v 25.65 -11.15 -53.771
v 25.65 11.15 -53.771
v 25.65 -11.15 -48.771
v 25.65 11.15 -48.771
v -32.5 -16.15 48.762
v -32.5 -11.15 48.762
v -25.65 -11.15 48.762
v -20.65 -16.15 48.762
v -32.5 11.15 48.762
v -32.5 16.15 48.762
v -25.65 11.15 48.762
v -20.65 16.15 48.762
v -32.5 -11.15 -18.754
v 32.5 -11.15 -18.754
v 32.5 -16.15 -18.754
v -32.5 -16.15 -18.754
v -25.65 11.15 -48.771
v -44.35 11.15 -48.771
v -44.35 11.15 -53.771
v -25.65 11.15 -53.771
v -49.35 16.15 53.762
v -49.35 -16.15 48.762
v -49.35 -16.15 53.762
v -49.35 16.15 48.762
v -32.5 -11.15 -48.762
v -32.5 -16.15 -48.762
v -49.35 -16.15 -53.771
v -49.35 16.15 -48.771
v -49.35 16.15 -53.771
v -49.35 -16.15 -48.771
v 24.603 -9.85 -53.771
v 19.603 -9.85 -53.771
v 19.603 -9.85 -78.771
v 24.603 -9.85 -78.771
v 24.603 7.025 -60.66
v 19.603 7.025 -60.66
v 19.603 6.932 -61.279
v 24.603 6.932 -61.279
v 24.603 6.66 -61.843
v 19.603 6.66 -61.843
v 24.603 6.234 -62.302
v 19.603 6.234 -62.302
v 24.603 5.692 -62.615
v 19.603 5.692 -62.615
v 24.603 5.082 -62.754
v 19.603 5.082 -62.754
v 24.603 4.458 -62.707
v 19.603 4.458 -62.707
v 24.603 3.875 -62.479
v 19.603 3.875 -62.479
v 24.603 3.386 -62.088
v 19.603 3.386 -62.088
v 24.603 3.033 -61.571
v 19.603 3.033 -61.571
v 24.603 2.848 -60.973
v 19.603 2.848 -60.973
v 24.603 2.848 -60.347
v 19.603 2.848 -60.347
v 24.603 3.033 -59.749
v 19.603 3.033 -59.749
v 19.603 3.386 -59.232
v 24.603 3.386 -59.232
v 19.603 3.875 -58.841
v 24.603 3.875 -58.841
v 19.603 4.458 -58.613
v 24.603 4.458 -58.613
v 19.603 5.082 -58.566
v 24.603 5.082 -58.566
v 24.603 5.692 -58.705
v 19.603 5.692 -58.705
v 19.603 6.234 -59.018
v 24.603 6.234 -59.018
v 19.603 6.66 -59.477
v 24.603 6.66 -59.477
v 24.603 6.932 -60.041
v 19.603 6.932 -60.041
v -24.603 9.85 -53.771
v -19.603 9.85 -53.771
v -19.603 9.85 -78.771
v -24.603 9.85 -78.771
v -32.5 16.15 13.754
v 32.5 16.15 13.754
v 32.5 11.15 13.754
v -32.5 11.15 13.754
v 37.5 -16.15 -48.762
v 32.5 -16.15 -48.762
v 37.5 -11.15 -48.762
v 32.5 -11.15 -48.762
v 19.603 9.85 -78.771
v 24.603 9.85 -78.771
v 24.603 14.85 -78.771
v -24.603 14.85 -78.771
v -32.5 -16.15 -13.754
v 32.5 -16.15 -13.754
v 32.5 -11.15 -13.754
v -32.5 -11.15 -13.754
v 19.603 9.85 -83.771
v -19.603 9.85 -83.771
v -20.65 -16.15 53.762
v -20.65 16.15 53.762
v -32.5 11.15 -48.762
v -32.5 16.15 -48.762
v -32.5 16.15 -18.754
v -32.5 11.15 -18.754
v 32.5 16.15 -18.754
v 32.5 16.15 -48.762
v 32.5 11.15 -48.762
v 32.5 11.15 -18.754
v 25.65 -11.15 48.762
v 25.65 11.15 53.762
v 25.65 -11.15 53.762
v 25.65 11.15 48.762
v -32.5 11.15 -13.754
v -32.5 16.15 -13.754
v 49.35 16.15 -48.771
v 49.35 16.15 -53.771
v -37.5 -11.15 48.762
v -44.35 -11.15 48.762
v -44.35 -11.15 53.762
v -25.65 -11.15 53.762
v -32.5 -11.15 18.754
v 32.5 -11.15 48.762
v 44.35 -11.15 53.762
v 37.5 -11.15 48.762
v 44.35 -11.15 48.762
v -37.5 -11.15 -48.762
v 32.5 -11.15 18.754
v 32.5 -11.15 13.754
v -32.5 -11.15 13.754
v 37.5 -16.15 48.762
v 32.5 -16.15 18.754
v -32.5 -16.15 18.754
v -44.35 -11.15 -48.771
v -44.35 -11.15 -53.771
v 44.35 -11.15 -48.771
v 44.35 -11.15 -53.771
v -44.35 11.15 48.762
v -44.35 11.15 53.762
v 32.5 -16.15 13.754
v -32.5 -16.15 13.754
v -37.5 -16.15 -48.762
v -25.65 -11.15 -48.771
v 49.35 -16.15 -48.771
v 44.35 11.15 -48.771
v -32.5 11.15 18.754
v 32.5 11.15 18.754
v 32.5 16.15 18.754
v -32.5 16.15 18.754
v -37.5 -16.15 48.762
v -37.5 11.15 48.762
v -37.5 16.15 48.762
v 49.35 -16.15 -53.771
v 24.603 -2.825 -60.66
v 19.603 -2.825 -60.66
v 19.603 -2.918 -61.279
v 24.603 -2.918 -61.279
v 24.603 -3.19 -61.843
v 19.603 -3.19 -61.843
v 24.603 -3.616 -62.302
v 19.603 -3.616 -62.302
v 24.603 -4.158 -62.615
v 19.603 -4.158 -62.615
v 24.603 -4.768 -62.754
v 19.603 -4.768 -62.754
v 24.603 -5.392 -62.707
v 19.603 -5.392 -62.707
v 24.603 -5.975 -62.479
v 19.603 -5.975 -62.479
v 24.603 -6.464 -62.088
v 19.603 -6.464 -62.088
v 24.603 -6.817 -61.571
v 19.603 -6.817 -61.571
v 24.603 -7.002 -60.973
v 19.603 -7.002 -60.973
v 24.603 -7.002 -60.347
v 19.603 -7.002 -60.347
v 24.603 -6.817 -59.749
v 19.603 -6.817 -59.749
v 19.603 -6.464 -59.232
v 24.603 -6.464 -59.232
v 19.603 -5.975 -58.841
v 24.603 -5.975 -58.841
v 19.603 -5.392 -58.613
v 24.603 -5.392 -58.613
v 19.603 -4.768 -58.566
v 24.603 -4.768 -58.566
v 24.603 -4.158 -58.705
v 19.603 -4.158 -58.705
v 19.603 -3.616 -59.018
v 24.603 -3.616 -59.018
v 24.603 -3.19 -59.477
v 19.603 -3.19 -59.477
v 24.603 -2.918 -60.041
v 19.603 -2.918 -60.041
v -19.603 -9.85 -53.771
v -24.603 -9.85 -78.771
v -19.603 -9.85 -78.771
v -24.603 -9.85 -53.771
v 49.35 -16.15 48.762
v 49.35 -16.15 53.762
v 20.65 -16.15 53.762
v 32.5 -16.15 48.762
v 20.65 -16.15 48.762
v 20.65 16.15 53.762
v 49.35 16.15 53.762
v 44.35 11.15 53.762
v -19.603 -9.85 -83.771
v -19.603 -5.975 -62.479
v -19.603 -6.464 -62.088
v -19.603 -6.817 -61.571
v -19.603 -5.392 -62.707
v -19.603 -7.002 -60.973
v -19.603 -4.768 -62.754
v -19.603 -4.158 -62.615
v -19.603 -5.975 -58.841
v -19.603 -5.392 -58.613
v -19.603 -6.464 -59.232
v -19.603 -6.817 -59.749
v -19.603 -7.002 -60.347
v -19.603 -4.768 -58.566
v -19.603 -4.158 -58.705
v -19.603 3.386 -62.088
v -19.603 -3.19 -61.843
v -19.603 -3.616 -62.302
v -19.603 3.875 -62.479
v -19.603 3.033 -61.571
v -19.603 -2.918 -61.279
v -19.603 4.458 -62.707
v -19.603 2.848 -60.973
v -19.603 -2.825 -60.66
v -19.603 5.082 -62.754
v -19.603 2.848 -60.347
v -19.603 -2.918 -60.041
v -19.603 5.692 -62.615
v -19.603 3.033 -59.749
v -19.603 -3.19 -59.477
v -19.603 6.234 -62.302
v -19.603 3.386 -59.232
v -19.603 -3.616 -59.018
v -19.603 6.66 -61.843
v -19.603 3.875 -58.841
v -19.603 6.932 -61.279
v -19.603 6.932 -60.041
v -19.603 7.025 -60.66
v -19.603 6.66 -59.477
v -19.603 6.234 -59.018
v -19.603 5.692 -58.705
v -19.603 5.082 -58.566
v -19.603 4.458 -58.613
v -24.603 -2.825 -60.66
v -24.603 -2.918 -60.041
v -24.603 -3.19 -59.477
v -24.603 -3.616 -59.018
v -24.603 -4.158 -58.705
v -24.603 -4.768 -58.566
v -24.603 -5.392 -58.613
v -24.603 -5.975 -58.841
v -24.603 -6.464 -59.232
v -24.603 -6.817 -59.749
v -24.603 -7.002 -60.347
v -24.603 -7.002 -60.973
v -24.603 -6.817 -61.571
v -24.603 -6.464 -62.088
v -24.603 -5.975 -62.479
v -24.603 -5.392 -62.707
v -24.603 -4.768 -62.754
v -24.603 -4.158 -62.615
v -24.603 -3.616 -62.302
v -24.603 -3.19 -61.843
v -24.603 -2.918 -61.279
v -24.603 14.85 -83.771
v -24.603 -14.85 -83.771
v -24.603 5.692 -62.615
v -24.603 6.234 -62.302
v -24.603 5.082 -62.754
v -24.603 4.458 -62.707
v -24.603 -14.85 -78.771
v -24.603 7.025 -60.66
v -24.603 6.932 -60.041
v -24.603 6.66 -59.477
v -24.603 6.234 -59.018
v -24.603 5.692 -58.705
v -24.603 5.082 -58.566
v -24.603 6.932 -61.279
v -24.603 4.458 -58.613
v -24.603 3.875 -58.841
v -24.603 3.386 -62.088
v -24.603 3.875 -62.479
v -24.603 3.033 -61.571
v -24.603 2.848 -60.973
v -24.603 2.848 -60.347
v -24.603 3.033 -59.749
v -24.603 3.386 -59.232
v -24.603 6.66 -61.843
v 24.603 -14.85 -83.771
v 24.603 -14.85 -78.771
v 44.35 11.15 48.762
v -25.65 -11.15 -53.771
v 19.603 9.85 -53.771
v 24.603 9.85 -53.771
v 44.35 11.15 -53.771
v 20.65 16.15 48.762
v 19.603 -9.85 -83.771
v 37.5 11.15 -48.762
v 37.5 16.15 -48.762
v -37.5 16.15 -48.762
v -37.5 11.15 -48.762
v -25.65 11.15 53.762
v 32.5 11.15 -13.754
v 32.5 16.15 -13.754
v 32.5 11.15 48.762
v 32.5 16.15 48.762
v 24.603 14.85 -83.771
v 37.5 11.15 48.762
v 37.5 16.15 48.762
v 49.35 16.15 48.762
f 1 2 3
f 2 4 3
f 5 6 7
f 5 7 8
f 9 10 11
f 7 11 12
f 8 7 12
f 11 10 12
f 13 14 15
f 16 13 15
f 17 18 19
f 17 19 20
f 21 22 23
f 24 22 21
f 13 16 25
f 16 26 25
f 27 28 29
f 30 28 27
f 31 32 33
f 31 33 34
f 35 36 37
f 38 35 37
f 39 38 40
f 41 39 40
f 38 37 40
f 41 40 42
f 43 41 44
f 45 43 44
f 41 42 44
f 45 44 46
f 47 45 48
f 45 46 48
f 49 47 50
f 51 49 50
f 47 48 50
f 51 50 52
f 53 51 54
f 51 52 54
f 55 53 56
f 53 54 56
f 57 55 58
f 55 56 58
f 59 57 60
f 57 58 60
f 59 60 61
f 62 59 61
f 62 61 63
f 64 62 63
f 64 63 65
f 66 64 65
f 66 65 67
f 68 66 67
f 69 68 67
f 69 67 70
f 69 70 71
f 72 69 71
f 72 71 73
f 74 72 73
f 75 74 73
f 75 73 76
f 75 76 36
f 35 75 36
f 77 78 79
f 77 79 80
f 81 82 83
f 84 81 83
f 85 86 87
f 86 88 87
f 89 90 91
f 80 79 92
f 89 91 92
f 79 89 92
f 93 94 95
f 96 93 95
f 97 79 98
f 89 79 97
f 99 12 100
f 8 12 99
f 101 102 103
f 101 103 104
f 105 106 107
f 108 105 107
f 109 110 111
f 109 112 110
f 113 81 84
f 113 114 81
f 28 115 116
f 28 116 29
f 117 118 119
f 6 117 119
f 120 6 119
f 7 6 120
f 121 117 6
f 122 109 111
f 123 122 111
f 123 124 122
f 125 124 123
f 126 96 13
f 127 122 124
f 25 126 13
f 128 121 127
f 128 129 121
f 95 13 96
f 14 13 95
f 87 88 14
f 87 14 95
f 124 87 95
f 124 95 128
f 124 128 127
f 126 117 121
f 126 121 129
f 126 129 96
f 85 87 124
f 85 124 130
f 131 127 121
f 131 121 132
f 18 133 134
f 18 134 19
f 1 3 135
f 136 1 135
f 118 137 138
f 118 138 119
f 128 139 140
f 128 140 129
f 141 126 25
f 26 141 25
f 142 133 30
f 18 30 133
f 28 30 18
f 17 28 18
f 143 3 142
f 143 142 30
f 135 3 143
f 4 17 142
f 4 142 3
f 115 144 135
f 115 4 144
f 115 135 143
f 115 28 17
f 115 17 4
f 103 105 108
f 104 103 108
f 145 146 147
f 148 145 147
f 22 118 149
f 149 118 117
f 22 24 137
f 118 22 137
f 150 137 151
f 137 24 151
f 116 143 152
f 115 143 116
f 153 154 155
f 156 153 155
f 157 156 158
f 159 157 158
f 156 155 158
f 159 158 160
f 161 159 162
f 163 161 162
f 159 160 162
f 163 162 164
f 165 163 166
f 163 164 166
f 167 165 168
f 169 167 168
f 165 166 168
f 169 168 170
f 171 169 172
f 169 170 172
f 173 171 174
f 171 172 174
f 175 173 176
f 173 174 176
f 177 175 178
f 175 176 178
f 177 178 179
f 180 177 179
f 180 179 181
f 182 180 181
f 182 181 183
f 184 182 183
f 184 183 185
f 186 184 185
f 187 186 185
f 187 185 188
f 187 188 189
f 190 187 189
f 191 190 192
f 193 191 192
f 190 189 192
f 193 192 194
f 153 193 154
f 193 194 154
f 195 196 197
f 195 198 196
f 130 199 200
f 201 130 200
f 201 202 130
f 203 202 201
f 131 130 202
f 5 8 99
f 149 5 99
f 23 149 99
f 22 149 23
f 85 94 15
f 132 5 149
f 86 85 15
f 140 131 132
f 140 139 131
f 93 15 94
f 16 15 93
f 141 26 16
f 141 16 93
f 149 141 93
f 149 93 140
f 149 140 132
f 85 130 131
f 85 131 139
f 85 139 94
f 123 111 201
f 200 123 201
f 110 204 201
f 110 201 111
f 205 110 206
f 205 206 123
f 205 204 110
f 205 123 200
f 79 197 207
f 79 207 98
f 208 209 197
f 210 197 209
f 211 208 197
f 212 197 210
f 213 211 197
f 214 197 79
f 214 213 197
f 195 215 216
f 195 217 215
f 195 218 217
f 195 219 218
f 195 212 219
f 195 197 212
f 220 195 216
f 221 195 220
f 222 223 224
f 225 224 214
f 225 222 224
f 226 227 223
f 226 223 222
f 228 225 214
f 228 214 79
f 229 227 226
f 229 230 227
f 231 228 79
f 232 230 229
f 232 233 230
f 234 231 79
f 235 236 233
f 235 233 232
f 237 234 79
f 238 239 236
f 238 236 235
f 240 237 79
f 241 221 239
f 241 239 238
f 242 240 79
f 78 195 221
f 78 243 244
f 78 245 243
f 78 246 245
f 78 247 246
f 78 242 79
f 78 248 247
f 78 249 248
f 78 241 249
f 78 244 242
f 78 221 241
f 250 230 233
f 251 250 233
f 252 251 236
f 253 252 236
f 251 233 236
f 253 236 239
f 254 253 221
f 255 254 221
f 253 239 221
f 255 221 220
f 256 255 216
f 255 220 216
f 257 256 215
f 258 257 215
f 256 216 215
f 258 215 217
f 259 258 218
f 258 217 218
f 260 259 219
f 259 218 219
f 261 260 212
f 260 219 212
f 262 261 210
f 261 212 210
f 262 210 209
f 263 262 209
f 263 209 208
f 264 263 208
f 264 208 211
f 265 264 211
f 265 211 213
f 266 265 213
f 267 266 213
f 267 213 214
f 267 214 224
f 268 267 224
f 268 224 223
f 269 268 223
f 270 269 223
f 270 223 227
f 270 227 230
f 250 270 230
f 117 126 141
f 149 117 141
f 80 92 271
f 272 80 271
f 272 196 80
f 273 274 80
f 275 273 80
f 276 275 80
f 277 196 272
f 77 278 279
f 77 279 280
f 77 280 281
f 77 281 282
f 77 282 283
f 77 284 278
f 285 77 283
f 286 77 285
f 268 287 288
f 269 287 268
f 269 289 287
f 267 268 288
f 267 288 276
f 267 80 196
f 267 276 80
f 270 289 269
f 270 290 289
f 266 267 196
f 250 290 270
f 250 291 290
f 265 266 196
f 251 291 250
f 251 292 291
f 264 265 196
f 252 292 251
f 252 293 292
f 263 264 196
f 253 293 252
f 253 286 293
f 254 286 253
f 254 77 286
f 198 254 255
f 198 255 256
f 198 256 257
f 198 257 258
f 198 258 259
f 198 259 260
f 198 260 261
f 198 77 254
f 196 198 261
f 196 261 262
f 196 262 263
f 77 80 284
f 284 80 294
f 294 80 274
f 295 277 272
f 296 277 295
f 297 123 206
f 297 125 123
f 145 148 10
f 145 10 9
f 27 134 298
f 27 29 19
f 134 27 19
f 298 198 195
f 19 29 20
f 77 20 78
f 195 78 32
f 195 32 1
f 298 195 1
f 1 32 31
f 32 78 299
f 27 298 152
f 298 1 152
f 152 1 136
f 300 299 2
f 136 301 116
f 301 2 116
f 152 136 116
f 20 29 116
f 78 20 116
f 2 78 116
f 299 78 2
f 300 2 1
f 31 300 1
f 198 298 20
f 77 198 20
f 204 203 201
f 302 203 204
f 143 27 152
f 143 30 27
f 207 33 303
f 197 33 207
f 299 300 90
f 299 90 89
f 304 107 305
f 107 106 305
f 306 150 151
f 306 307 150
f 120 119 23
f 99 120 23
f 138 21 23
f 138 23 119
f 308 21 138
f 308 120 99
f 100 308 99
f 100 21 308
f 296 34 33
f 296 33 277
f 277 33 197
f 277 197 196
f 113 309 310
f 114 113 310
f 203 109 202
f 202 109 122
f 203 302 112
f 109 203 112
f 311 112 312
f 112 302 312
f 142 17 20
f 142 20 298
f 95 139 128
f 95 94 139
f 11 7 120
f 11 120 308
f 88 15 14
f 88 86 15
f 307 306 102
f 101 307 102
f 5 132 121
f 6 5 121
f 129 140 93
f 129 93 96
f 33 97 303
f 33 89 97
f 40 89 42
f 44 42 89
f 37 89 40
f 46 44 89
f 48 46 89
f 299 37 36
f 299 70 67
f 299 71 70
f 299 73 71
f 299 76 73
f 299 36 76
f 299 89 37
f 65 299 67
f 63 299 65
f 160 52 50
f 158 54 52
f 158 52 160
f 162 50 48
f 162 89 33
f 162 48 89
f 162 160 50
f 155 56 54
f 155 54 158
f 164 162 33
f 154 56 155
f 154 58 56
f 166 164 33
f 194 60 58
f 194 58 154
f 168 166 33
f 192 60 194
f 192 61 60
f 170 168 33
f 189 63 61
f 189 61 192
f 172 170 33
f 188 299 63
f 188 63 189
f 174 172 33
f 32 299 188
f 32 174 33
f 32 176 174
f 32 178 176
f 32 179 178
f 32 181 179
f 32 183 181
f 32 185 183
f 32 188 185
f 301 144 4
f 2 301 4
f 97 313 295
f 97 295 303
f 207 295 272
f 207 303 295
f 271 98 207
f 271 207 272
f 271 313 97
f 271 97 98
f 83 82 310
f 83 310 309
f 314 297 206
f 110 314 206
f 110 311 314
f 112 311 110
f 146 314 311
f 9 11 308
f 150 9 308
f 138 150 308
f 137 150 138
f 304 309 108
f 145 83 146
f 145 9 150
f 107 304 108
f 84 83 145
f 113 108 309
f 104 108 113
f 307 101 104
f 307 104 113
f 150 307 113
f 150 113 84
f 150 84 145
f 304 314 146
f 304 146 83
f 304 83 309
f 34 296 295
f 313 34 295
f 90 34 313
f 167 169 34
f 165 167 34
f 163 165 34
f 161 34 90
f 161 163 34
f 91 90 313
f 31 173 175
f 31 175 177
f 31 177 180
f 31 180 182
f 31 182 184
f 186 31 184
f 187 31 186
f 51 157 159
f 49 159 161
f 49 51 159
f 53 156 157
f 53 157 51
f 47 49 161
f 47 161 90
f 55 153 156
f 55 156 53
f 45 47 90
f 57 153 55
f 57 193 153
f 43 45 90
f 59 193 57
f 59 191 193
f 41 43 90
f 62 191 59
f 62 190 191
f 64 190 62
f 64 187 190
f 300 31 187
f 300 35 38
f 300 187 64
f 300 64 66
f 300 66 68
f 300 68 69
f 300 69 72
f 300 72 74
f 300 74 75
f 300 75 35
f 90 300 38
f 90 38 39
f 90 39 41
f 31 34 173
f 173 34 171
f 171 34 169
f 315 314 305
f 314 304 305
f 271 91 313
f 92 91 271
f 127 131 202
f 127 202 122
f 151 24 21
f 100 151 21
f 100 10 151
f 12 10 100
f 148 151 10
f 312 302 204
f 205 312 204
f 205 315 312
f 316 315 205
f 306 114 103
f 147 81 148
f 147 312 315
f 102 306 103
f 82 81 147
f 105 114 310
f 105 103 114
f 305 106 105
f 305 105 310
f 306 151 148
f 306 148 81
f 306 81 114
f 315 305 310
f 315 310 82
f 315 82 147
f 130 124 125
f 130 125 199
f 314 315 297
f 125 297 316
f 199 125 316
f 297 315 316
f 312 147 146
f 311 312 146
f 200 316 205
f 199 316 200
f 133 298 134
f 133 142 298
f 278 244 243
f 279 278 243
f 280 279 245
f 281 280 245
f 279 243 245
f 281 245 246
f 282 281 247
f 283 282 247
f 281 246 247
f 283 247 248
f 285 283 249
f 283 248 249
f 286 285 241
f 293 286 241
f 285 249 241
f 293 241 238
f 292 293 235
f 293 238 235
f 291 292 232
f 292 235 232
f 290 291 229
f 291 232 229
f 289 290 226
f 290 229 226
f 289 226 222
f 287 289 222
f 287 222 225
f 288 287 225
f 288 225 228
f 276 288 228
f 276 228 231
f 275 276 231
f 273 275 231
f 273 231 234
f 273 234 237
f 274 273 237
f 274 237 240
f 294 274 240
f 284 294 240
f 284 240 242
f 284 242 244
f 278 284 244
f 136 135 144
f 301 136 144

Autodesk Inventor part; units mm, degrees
sketch "Sketch1" plane through (0, 0, 0) normal (0, 0, 1) x (1, 0, 0)
  line L0 (-32.5, 11.15) -> (32.5, 11.15) construction
  line L1 (32.5, 11.15) -> (32.5, -11.15) construction
  line L2 (32.5, -11.15) -> (-32.5, -11.15) construction
  line L3 (-32.5, -11.15) -> (-32.5, 11.15) construction
  line L4 (-32.5, 11.15) -> (32.5, -11.15) construction
  line L5 (32.5, 11.15) -> (-32.5, -11.15) construction
  line L6 (-32.5, 11.15) -> (-37.5, 11.15)
  line L7 (-37.5, 11.15) -> (-37.5, 16.15)
  line L8 (-37.5, 16.15) -> (-32.5, 16.15)
  line L9 (-32.5, 16.15) -> (-32.5, 11.15)
  line L10 (32.5, 11.15) -> (37.5, 11.15)
  line L11 (37.5, 11.15) -> (37.5, 16.15)
  line L12 (37.5, 16.15) -> (32.5, 16.15)
  line L13 (32.5, 16.15) -> (32.5, 11.15)
  line L14 (32.5, -11.15) -> (37.5, -11.15)
  line L15 (37.5, -11.15) -> (37.5, -16.15)
  line L16 (37.5, -16.15) -> (32.5, -16.15)
  line L17 (32.5, -16.15) -> (32.5, -11.15)
  line L18 (-32.5, -11.15) -> (-37.5, -11.15)
  line L19 (-37.5, -11.15) -> (-37.5, -16.15)
  line L20 (-37.5, -16.15) -> (-32.5, -16.15)
  line L21 (-32.5, -16.15) -> (-32.5, -11.15)
  point P0 (0, 0)
  dimension "d0" = 65
  dimension "d1" = 22.3
  dimension "d2" = 5
  dimension "d3" = 5
  dimension "d4" = 5
  dimension "d5" = 5
  dimension "d6" = 5
  dimension "d7" = 5
  dimension "d8" = 5
  dimension "d9" = 5
extrude "Extrusion1" add sketch "Sketch1" along normal mid plane 97.524
ref_plane "Work Plane1" through (0, 0, 48.762) normal (0, 0, 1) x (1, 0, 0)
sketch "Sketch2" plane through (0, 0, 48.762) normal (0, 0, 1) x (1, 0, 0)
  line L0 (0, 0) -> (-35, 0) construction
  line L1 (0, 0) -> (35, 0) construction
  line L2 (-49.35, 16.15) -> (-20.65, 16.15)
  line L3 (-20.65, 16.15) -> (-20.65, -16.15)
  line L4 (-20.65, -16.15) -> (-49.35, -16.15)
  line L5 (-49.35, -16.15) -> (-49.35, 16.15)
  line L6 (-49.35, 16.15) -> (-20.65, -16.15) construction
  line L7 (-20.65, 16.15) -> (-49.35, -16.15) construction
  line L8 (20.65, 16.15) -> (49.35, 16.15)
  line L9 (49.35, 16.15) -> (49.35, -16.15)
  line L10 (49.35, -16.15) -> (20.65, -16.15)
  line L11 (20.65, -16.15) -> (20.65, 16.15)
  line L12 (20.65, 16.15) -> (49.35, -16.15) construction
  line L13 (49.35, 16.15) -> (20.65, -16.15) construction
  line L14 (-25.65, 11.15) -> (-44.35, 11.15)
  line L15 (-44.35, 11.15) -> (-44.35, -11.15)
  line L16 (-44.35, -11.15) -> (-25.65, -11.15)
  line L17 (-25.65, -11.15) -> (-25.65, 11.15)
  line L18 (44.35, 11.15) -> (25.65, 11.15)
  line L19 (25.65, 11.15) -> (25.65, -11.15)
  line L20 (25.65, -11.15) -> (44.35, -11.15)
  line L21 (44.35, -11.15) -> (44.35, 11.15)
  dimension "d13" = 35
  dimension "d14" = 35
  dimension "d15" = 28.7
  dimension "d16" = 32.3
  dimension "d17" = 28.7
  dimension "d18" = 32.3
  dimension "d19" = 5
  dimension "d20" = 5
extrude "Extrusion2" add sketch "Sketch2" along normal blind 5
ref_plane "Work Plane2" through (0, 0, -48.771) normal (0, 0, 1) x (1, 0, 0)
sketch "Sketch3" plane through (0, 0, -48.771) normal (0, 0, 1) x (1, 0, 0)
  line L0 (49.35, 16.15) -> (-49.35, 16.15)
  line L1 (-49.35, 16.15) -> (-49.35, -16.15)
  line L2 (-49.35, -16.15) -> (49.35, -16.15)
  line L3 (49.35, -16.15) -> (49.35, 16.15)
  line L4 (49.35, 16.15) -> (-49.35, -16.15) construction
  line L5 (-49.35, 16.15) -> (49.35, -16.15) construction
  line L6 (0, 0) -> (35, 0) construction
  line L7 (0, 0) -> (-35, 0) construction
  line L8 (32.5, -11.15) -> (25.65, -11.15) projected
  line L9 (44.35, 11.15) -> (25.65, 11.15)
  line L10 (25.65, 11.15) -> (25.65, -11.15)
  line L11 (25.65, -11.15) -> (44.35, -11.15)
  line L12 (44.35, -11.15) -> (44.35, 11.15)
  line L13 (44.35, 11.15) -> (25.65, -11.15) construction
  line L14 (25.65, 11.15) -> (44.35, -11.15) construction
  line L15 (-44.35, -11.15) -> (-44.35, 11.15) projected
  line L16 (-25.65, -11.15) -> (-44.35, -11.15)
  line L17 (-44.35, -11.15) -> (-44.35, 11.15)
  line L18 (-44.35, 11.15) -> (-25.65, 11.15)
  line L19 (-25.65, 11.15) -> (-25.65, -11.15)
  line L20 (-25.65, -11.15) -> (-44.35, 11.15) construction
  line L21 (-44.35, -11.15) -> (-25.65, 11.15) construction
  point P0 (30, -11.15)
  dimension "d24" = 98.7
  dimension "d25" = 32.3
  dimension "d26" = 35
  dimension "d27" = 35
extrude "Extrusion3" add sketch "Sketch3" against normal blind 5
sketch "Sketch4" plane through (0, 0, 0) normal (1, 0, 0) x (0, 1, 0)
  line L0 (11.15, -48.762) -> (11.15, 48.762) projected
  line L1 (11.15, 18.754) -> (16.15, 18.754)
  line L2 (16.15, 18.754) -> (16.15, 13.754)
  line L3 (16.15, 13.754) -> (11.15, 13.754)
  line L4 (11.15, 13.754) -> (11.15, 18.754)
  line L5 (-16.15, 48.762) -> (16.15, 48.762) projected
  line L6 (11.15, -13.754) -> (16.15, -13.754)
  line L7 (16.15, -13.754) -> (16.15, -18.754)
  line L8 (16.15, -18.754) -> (11.15, -18.754)
  line L9 (11.15, -18.754) -> (11.15, -13.754)
  line L10 (16.15, -48.762) -> (11.15, -48.762) projected
  line L11 (-11.15, 48.762) -> (-11.15, -48.762) projected
  line L12 (-11.15, 18.754) -> (-16.15, 18.754)
  line L13 (-16.15, 18.754) -> (-16.15, 13.754)
  line L14 (-16.15, 13.754) -> (-11.15, 13.754)
  line L15 (-11.15, 13.754) -> (-11.15, 18.754)
  line L16 (-11.15, -18.754) -> (-16.15, -18.754)
  line L17 (-16.15, -18.754) -> (-16.15, -13.754)
  line L18 (-16.15, -13.754) -> (-11.15, -13.754)
  line L19 (-11.15, -13.754) -> (-11.15, -18.754)
  line L20 (-11.15, -48.762) -> (-16.15, -48.762) projected
  point P0 (0, 0)
  dimension "d30" = 5
  dimension "d31" = 5
  dimension "d32" = 30.008
  dimension "d33" = 5
  dimension "d34" = 5
  dimension "d35" = 30.008
  dimension "d36" = 5
  dimension "d37" = 5
  dimension "d38" = 5
  dimension "d39" = 5
  dimension "d40" = 30.008
  dimension "d41" = 30.008
extrude "Extrusion4" add sketch "Sketch4" along normal mid plane 65
sketch "Sketch7" plane through (0, 0, -53.771) normal (0, 0, -1) x (-1, 0, 0)
  line L0 (-24.603, 9.85) -> (24.603, 9.85)
  line L1 (24.603, 9.85) -> (24.603, -9.85)
  line L2 (24.603, -9.85) -> (-24.603, -9.85)
  line L3 (-24.603, -9.85) -> (-24.603, 9.85)
  line L4 (-24.603, 9.85) -> (24.603, -9.85) construction
  line L5 (24.603, 9.85) -> (-24.603, -9.85) construction
  line L6 (19.603, 9.85) -> (19.603, -9.85)
  line L7 (-19.603, 9.85) -> (-19.603, -9.85)
  point P0 (0, 0)
  dimension "d54" = 49.206
  dimension "d55" = 19.7
  dimension "d56" = 5
  dimension "d57" = 5
extrude "Extrusion7" add sketch "Sketch7" along normal blind 25 contours L0 L7 L2 L3 | L0 L1 L2 L6
ref_plane "Work Plane3" through (0, 0, -78.771) normal (0, 0, -1) x (-1, 0, 0)
sketch "Sketch8" plane through (0, 0, -78.771) normal (0, 0, -1) x (-1, 0, 0)
  line L0 (-24.603, 14.85) -> (24.603, 14.85)
  line L1 (24.603, 14.85) -> (24.603, -14.85)
  line L2 (24.603, -14.85) -> (-24.603, -14.85)
  line L3 (-24.603, -14.85) -> (-24.603, 14.85)
  line L4 (-24.603, 14.85) -> (24.603, -14.85) construction
  line L5 (24.603, 14.85) -> (-24.603, -14.85) construction
  line L6 (19.603, 9.85) -> (-19.603, 9.85)
  line L7 (-19.603, 9.85) -> (-19.603, -9.85)
  line L8 (-19.603, -9.85) -> (19.603, -9.85)
  line L9 (19.603, -9.85) -> (19.603, 9.85)
  point P0 (0, 0)
  dimension "d61" = 49.206
  dimension "d62" = 29.7
  dimension "d63" = 5
extrude "Extrusion8" add sketch "Sketch8" along normal blind 5
sketch "Sketch9" plane through (0, 0, 0) normal (1, 0, 0) x (0, 1, 0)
  circle A0 centre (4.925, -60.66) radius 2.1
  line L0 (14.85, -78.771) -> (9.85, -78.771) projected
  line L1 (9.85, -53.771) -> (9.85, -78.771) projected
  circle A1 centre (-4.925, -60.66) radius 2.1
  line L2 (-9.85, -78.771) -> (-14.85, -78.771) projected
  line L3 (-9.85, -53.771) -> (-9.85, -78.771) projected
  point P0 (0, 0)
  dimension "d66" = 4.2
  dimension "d67" = 18.111
  dimension "d68" = 4.925
  dimension "d69" = 4.2
  dimension "d70" = 18.111
  dimension "d71" = 4.925
extrude "Extrusion9" cut sketch "Sketch9" along normal through all both and the other way through all
properties part number "MTail"
